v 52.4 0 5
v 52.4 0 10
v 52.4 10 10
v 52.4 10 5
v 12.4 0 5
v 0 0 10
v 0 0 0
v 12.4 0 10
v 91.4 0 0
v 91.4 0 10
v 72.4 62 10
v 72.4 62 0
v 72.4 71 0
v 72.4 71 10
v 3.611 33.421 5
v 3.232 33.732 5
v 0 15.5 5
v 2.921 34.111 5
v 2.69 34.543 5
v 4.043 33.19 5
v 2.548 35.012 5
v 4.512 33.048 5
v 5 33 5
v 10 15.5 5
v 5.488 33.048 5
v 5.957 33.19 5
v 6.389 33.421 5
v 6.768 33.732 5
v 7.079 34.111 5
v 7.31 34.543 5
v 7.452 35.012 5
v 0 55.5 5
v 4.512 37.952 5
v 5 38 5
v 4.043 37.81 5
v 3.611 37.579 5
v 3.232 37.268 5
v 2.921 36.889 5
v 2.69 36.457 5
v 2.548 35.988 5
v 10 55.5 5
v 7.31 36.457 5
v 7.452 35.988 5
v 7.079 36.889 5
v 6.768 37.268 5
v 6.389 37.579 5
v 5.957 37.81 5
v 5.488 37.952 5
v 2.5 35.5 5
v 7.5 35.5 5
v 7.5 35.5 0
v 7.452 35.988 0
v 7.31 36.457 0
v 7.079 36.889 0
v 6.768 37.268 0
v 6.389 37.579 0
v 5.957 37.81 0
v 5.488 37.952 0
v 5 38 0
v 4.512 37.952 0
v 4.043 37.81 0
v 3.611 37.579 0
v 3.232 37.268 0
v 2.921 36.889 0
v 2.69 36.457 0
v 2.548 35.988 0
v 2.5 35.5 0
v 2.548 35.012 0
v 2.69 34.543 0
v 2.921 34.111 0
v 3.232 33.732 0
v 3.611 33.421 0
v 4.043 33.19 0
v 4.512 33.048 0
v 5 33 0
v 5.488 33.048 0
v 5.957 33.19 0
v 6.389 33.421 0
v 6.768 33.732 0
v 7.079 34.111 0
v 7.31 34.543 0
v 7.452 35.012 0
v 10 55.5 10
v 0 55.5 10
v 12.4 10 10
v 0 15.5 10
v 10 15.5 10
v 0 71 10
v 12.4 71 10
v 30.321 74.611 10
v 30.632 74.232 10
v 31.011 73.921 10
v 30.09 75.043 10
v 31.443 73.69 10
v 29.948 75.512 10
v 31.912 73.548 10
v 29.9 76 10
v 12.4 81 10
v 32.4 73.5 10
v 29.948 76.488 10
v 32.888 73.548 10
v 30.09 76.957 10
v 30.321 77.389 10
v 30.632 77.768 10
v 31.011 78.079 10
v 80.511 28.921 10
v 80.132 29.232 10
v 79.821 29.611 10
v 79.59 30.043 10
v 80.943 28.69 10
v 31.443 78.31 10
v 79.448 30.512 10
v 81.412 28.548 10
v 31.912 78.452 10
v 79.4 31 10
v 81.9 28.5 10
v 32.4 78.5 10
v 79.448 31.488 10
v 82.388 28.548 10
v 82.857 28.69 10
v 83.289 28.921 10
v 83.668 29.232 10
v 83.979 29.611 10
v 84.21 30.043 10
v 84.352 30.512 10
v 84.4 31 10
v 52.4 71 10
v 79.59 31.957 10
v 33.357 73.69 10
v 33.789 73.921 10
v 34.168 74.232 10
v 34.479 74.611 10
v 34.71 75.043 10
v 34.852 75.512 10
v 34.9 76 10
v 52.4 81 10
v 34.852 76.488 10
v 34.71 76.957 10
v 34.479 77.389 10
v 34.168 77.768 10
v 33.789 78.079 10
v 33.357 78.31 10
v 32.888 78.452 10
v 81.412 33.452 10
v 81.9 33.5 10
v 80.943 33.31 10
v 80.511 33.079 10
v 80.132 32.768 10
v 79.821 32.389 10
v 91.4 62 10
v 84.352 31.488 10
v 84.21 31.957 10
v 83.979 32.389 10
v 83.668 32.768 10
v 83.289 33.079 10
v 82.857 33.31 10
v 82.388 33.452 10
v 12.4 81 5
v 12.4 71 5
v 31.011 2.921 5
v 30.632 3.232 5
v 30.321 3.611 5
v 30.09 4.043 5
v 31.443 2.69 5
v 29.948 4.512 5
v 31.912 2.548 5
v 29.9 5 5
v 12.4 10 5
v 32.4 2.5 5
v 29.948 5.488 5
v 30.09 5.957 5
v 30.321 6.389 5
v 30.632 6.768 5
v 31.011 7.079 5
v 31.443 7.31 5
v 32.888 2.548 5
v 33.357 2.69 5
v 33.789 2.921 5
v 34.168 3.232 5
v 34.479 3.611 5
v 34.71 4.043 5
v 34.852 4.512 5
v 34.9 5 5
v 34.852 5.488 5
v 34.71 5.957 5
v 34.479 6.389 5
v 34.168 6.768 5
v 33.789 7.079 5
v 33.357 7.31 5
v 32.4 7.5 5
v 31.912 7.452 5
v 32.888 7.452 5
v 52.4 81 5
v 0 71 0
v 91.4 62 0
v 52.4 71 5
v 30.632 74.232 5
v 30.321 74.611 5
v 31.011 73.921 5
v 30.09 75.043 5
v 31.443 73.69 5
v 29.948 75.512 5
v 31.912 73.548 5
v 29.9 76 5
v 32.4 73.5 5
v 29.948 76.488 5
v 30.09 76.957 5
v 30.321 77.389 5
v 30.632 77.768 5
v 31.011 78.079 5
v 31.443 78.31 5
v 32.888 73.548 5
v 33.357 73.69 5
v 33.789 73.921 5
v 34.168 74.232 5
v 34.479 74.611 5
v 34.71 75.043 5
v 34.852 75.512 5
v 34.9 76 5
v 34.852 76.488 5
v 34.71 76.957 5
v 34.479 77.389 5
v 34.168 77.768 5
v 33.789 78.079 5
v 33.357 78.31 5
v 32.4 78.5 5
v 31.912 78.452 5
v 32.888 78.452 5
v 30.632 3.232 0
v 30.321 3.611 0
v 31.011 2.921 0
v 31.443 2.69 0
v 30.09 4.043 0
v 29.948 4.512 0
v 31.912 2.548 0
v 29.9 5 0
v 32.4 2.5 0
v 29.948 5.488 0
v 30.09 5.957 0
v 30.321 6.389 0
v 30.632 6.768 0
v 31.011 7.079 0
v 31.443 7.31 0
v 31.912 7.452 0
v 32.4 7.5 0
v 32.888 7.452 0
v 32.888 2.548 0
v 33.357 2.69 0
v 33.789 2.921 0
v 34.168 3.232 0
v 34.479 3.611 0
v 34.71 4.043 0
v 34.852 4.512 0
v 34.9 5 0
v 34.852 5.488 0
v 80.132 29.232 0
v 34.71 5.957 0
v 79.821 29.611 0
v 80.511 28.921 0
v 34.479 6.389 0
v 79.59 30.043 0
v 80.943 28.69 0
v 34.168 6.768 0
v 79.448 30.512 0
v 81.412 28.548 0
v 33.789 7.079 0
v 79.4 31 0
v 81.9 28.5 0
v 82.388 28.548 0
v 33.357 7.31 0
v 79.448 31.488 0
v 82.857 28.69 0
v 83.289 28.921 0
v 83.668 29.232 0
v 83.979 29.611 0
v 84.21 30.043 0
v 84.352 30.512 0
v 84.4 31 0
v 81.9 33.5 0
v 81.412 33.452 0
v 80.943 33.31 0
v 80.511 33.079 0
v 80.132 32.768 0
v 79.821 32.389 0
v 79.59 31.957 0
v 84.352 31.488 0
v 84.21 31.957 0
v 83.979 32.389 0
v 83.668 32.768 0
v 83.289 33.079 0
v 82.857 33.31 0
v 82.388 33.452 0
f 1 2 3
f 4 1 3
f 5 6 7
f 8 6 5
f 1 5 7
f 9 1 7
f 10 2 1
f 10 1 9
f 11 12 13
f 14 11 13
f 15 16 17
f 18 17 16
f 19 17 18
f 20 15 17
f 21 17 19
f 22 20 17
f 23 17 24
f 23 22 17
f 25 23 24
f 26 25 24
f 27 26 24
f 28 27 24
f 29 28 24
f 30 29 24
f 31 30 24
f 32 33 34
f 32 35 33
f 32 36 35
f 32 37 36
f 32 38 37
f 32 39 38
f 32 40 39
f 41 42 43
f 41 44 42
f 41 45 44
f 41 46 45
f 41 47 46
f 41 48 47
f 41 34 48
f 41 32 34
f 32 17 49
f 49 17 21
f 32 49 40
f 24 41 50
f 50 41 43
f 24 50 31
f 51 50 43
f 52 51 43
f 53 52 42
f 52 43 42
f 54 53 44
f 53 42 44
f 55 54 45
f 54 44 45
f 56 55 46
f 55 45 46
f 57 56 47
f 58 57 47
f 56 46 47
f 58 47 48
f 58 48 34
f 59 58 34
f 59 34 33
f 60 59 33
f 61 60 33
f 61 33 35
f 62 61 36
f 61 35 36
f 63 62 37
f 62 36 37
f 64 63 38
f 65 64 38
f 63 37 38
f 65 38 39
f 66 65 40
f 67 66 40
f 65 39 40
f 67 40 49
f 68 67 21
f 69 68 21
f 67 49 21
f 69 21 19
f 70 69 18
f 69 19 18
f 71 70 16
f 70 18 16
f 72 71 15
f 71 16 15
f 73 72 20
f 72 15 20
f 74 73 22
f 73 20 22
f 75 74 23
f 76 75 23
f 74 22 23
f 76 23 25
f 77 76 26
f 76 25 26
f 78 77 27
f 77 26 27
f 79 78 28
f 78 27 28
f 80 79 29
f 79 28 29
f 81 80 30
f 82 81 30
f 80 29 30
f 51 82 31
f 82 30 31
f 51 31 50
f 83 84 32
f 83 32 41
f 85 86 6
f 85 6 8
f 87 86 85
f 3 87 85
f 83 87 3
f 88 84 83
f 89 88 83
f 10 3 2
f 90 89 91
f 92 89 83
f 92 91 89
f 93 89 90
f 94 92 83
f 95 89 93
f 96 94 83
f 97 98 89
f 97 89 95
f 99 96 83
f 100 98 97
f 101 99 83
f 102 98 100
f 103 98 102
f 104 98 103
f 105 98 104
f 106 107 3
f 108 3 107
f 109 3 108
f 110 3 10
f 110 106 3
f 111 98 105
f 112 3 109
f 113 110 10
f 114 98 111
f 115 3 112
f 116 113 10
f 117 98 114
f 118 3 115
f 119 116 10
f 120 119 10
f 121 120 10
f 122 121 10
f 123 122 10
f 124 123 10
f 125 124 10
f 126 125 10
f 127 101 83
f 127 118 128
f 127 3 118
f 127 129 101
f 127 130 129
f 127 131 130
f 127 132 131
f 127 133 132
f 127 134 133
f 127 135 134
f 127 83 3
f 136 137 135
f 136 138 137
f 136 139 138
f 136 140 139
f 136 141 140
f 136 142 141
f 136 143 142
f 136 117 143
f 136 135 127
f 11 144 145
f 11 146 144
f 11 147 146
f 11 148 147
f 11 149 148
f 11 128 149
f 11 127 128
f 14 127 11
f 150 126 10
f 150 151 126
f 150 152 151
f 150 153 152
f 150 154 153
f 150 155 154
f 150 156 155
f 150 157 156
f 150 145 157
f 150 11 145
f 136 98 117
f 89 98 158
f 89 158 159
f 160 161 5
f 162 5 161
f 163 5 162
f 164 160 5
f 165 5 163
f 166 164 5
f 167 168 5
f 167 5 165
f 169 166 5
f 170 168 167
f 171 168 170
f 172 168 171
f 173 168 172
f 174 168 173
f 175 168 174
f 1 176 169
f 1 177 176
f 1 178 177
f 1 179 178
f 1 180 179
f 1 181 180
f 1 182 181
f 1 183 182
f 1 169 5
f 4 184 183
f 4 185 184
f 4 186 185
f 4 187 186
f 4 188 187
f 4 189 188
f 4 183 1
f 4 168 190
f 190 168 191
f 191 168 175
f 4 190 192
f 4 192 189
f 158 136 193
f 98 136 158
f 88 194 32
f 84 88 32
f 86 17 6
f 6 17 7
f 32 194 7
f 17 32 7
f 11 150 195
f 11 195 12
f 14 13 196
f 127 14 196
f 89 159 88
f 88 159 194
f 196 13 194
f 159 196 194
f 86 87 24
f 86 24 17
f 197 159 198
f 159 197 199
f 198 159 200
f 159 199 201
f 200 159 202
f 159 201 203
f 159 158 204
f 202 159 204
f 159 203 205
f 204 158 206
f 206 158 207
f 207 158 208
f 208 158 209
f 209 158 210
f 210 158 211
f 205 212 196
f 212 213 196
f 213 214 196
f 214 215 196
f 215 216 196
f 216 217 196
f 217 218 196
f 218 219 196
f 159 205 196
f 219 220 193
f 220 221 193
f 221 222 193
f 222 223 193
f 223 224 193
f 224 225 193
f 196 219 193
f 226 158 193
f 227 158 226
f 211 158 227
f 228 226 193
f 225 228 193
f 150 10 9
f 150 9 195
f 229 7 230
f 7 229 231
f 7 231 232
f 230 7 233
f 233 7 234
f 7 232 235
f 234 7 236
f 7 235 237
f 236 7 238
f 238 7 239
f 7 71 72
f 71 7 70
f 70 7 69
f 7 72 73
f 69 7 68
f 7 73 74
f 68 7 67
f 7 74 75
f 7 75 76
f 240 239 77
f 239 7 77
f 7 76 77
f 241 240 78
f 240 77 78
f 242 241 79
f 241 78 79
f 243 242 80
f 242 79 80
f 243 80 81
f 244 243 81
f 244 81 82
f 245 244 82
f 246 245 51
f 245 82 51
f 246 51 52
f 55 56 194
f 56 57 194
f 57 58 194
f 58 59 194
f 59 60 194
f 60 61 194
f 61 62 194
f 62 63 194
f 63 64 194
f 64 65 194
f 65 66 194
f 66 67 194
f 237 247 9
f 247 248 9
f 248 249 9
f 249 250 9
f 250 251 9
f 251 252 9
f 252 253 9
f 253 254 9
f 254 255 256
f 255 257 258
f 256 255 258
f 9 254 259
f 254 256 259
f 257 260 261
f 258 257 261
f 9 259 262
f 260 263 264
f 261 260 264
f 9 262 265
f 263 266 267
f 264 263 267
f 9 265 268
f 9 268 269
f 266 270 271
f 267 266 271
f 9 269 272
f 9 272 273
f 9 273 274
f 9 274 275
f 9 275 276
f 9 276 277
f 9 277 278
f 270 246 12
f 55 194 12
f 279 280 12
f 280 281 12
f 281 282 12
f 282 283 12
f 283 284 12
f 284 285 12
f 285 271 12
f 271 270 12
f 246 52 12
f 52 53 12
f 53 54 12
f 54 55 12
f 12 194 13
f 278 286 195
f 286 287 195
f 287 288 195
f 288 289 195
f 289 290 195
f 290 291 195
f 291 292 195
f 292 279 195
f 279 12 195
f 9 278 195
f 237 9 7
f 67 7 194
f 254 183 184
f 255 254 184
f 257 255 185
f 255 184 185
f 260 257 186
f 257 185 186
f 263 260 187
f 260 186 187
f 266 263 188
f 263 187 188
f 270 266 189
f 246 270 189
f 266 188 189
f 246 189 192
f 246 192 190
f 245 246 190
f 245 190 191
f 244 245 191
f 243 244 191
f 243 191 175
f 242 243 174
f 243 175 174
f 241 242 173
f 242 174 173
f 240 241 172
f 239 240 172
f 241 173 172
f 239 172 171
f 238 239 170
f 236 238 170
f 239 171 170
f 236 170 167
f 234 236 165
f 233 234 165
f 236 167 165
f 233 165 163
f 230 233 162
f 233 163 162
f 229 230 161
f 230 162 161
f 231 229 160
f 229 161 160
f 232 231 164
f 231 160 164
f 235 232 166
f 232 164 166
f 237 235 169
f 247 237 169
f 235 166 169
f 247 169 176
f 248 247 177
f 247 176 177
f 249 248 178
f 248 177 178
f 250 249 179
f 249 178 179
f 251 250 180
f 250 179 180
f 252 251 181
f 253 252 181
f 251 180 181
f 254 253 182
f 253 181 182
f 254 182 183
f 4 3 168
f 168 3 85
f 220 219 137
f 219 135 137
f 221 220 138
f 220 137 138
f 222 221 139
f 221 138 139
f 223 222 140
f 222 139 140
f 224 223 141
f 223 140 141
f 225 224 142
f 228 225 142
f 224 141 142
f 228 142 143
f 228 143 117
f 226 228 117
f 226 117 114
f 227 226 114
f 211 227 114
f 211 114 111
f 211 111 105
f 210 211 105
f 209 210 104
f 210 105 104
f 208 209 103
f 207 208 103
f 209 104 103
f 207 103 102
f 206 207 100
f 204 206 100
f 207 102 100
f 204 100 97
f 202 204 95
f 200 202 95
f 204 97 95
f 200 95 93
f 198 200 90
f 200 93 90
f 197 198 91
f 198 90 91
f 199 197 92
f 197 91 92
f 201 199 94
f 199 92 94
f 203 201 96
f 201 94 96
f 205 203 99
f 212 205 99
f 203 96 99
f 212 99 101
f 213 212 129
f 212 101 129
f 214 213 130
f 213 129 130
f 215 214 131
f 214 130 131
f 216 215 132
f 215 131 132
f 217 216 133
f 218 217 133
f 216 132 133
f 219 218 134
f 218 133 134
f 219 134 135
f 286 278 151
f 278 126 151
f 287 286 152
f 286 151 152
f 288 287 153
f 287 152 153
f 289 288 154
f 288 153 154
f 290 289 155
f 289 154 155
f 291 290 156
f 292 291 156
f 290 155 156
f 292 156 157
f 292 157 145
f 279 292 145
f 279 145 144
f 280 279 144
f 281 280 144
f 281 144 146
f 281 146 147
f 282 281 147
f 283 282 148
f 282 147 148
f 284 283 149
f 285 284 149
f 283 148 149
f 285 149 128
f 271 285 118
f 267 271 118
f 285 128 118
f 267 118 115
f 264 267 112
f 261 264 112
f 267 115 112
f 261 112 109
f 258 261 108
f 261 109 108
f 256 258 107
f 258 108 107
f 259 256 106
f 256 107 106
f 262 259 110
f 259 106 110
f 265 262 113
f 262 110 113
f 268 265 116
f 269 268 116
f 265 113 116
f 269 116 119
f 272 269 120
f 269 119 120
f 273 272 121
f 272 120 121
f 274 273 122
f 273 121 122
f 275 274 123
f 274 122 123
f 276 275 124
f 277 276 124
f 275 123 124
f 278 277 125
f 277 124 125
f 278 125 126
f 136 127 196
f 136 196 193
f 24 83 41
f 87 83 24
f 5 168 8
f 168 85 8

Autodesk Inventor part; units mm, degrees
ref_plane "YZ Plane" through (0, 0, 0) normal (1, 0, 0) x (0, 1, 0)
ref_plane "XZ Plane" through (0, 0, 0) normal (0, 1, 0) x (-1, 0, 0)
ref_plane "XY Plane" through (0, 0, 0) normal (0, 0, 1) x (1, 0, 0)
sketch "Sketch1" plane through (0, 0, 0) normal (0, 0, 1) x (1, 0, 0)
  line L0 (0, 0) -> (72.4, 0)
  line L1 (72.4, 0) -> (72.4, 71)
  line L2 (72.4, 71) -> (0, 71)
  line L3 (0, 71) -> (0, 0)
  dimension "d0" = 72.4
  dimension "d1" = 71
extrude "Extrusion1" add sketch "Sketch1" along normal blind 10
sketch "Sketch2" plane through (0, 0, 10) normal (0, 0, 1) x (1, 0, 0)
  line L0 (12.4, 71) -> (52.4, 71)
  line L1 (52.4, 71) -> (52.4, 81)
  line L2 (52.4, 81) -> (12.4, 81)
  line L3 (12.4, 81) -> (12.4, 71)
  line L4 (72.4, 0) -> (72.4, 71) projected
  line L5 (72.4, 71) -> (0, 71) projected
  circle A0 centre (32.4, 76) radius 2.5
  point P0 (0, 0)
  point P1 (36.2, 71)
  point P2 (52.4, 76)
  point P3 (32.4, 81)
  dimension "d4" = 40
  dimension "d5" = 10
  dimension "d6" = 20
  dimension "d7" = 5
extrude "Extrusion2" add sketch "Sketch2" against normal blind 5
sketch "Sketch3" plane through (0, 0, 10) normal (0, 0, 1) x (1, 0, 0)
  line L0 (72.4, 0) -> (72.4, 71) projected
  line L1 (72.4, 0) -> (91.4, 0)
  line L2 (91.4, 0) -> (91.4, 62)
  line L3 (91.4, 62) -> (72.4, 62)
  line L4 (72.4, 62) -> (72.4, 0)
  line L5 (72.4, 71) -> (52.4, 71) projected
  point P0 (0, 0)
  dimension "d10" = 19
  dimension "d11" = 9
extrude "Extrusion3" add sketch "Sketch3" against normal blind 10
sketch "Sketch4" plane through (0, 0, 10) normal (0, 0, 1) x (1, 0, 0)
  line L0 (91.4, 62) -> (72.4, 62) projected
  circle A0 centre (81.9, 31) radius 2.5
  line L1 (91.4, 0) -> (91.4, 62) projected
  point P0 (0, 0)
  point P1 (81.9, 62)
  point P2 (91.4, 31)
  dimension "d15" = 5
extrude "Extrusion4" cut sketch "Sketch4" against normal through all
sketch "Sketch5" plane through (0, 0, 10) normal (0, 0, 1) x (1, 0, 0)
  line L0 (0, 0) -> (91.4, 0) projected
  line L1 (12.4, 0) -> (52.4, 0)
  line L2 (52.4, 0) -> (52.4, 10)
  line L3 (52.4, 10) -> (12.4, 10)
  line L4 (12.4, 10) -> (12.4, 0)
  line L5 (0, 71) -> (0, 0) projected
  line L6 (0, 55.5) -> (10, 55.5)
  line L7 (10, 55.5) -> (10, 15.5)
  line L8 (10, 15.5) -> (0, 15.5)
  line L9 (0, 15.5) -> (0, 55.5)
  point P0 (52.4, 81)
  point P1 (12.4, 81)
  point P2 (0, 35.5)
  point P3 (0, 35.5)
  dimension "d22" = 10
  dimension "d25" = 10
  dimension "d26" = 40
extrude "Extrusion5" cut sketch "Sketch5" against normal blind 5
sketch "Sketch6" plane through (0, 0, 5) normal (0, 0, 1) x (1, 0, 0)
  line L0 (0, 15.5) -> (0, 55.5) projected
  line L1 (10, 15.5) -> (0, 15.5) projected
  line L2 (10, 55.5) -> (10, 15.5) projected
  line L3 (0, 55.5) -> (10, 55.5) projected
  line L4 (52.4, 0) -> (12.4, 0) projected
  line L5 (52.4, 10) -> (52.4, 0) projected
  line L6 (12.4, 10) -> (52.4, 10) projected
  line L7 (12.4, 0) -> (12.4, 10) projected
  circle A0 centre (5, 35.5) radius 2.5
  circle A1 centre (32.4, 5) radius 2.5
  point P0 (0, 0)
  point P1 (0, 35.5)
  point P2 (12.4, 5)
  point P3 (32.4, 10)
  point P4 (5, 55.5)
  dimension "d27" = 5
  dimension "d28" = 5
extrude "Extrusion6" cut sketch "Sketch6" against normal through all contours A0 | A1
properties part number "SP003" material "ABS Plastic"
